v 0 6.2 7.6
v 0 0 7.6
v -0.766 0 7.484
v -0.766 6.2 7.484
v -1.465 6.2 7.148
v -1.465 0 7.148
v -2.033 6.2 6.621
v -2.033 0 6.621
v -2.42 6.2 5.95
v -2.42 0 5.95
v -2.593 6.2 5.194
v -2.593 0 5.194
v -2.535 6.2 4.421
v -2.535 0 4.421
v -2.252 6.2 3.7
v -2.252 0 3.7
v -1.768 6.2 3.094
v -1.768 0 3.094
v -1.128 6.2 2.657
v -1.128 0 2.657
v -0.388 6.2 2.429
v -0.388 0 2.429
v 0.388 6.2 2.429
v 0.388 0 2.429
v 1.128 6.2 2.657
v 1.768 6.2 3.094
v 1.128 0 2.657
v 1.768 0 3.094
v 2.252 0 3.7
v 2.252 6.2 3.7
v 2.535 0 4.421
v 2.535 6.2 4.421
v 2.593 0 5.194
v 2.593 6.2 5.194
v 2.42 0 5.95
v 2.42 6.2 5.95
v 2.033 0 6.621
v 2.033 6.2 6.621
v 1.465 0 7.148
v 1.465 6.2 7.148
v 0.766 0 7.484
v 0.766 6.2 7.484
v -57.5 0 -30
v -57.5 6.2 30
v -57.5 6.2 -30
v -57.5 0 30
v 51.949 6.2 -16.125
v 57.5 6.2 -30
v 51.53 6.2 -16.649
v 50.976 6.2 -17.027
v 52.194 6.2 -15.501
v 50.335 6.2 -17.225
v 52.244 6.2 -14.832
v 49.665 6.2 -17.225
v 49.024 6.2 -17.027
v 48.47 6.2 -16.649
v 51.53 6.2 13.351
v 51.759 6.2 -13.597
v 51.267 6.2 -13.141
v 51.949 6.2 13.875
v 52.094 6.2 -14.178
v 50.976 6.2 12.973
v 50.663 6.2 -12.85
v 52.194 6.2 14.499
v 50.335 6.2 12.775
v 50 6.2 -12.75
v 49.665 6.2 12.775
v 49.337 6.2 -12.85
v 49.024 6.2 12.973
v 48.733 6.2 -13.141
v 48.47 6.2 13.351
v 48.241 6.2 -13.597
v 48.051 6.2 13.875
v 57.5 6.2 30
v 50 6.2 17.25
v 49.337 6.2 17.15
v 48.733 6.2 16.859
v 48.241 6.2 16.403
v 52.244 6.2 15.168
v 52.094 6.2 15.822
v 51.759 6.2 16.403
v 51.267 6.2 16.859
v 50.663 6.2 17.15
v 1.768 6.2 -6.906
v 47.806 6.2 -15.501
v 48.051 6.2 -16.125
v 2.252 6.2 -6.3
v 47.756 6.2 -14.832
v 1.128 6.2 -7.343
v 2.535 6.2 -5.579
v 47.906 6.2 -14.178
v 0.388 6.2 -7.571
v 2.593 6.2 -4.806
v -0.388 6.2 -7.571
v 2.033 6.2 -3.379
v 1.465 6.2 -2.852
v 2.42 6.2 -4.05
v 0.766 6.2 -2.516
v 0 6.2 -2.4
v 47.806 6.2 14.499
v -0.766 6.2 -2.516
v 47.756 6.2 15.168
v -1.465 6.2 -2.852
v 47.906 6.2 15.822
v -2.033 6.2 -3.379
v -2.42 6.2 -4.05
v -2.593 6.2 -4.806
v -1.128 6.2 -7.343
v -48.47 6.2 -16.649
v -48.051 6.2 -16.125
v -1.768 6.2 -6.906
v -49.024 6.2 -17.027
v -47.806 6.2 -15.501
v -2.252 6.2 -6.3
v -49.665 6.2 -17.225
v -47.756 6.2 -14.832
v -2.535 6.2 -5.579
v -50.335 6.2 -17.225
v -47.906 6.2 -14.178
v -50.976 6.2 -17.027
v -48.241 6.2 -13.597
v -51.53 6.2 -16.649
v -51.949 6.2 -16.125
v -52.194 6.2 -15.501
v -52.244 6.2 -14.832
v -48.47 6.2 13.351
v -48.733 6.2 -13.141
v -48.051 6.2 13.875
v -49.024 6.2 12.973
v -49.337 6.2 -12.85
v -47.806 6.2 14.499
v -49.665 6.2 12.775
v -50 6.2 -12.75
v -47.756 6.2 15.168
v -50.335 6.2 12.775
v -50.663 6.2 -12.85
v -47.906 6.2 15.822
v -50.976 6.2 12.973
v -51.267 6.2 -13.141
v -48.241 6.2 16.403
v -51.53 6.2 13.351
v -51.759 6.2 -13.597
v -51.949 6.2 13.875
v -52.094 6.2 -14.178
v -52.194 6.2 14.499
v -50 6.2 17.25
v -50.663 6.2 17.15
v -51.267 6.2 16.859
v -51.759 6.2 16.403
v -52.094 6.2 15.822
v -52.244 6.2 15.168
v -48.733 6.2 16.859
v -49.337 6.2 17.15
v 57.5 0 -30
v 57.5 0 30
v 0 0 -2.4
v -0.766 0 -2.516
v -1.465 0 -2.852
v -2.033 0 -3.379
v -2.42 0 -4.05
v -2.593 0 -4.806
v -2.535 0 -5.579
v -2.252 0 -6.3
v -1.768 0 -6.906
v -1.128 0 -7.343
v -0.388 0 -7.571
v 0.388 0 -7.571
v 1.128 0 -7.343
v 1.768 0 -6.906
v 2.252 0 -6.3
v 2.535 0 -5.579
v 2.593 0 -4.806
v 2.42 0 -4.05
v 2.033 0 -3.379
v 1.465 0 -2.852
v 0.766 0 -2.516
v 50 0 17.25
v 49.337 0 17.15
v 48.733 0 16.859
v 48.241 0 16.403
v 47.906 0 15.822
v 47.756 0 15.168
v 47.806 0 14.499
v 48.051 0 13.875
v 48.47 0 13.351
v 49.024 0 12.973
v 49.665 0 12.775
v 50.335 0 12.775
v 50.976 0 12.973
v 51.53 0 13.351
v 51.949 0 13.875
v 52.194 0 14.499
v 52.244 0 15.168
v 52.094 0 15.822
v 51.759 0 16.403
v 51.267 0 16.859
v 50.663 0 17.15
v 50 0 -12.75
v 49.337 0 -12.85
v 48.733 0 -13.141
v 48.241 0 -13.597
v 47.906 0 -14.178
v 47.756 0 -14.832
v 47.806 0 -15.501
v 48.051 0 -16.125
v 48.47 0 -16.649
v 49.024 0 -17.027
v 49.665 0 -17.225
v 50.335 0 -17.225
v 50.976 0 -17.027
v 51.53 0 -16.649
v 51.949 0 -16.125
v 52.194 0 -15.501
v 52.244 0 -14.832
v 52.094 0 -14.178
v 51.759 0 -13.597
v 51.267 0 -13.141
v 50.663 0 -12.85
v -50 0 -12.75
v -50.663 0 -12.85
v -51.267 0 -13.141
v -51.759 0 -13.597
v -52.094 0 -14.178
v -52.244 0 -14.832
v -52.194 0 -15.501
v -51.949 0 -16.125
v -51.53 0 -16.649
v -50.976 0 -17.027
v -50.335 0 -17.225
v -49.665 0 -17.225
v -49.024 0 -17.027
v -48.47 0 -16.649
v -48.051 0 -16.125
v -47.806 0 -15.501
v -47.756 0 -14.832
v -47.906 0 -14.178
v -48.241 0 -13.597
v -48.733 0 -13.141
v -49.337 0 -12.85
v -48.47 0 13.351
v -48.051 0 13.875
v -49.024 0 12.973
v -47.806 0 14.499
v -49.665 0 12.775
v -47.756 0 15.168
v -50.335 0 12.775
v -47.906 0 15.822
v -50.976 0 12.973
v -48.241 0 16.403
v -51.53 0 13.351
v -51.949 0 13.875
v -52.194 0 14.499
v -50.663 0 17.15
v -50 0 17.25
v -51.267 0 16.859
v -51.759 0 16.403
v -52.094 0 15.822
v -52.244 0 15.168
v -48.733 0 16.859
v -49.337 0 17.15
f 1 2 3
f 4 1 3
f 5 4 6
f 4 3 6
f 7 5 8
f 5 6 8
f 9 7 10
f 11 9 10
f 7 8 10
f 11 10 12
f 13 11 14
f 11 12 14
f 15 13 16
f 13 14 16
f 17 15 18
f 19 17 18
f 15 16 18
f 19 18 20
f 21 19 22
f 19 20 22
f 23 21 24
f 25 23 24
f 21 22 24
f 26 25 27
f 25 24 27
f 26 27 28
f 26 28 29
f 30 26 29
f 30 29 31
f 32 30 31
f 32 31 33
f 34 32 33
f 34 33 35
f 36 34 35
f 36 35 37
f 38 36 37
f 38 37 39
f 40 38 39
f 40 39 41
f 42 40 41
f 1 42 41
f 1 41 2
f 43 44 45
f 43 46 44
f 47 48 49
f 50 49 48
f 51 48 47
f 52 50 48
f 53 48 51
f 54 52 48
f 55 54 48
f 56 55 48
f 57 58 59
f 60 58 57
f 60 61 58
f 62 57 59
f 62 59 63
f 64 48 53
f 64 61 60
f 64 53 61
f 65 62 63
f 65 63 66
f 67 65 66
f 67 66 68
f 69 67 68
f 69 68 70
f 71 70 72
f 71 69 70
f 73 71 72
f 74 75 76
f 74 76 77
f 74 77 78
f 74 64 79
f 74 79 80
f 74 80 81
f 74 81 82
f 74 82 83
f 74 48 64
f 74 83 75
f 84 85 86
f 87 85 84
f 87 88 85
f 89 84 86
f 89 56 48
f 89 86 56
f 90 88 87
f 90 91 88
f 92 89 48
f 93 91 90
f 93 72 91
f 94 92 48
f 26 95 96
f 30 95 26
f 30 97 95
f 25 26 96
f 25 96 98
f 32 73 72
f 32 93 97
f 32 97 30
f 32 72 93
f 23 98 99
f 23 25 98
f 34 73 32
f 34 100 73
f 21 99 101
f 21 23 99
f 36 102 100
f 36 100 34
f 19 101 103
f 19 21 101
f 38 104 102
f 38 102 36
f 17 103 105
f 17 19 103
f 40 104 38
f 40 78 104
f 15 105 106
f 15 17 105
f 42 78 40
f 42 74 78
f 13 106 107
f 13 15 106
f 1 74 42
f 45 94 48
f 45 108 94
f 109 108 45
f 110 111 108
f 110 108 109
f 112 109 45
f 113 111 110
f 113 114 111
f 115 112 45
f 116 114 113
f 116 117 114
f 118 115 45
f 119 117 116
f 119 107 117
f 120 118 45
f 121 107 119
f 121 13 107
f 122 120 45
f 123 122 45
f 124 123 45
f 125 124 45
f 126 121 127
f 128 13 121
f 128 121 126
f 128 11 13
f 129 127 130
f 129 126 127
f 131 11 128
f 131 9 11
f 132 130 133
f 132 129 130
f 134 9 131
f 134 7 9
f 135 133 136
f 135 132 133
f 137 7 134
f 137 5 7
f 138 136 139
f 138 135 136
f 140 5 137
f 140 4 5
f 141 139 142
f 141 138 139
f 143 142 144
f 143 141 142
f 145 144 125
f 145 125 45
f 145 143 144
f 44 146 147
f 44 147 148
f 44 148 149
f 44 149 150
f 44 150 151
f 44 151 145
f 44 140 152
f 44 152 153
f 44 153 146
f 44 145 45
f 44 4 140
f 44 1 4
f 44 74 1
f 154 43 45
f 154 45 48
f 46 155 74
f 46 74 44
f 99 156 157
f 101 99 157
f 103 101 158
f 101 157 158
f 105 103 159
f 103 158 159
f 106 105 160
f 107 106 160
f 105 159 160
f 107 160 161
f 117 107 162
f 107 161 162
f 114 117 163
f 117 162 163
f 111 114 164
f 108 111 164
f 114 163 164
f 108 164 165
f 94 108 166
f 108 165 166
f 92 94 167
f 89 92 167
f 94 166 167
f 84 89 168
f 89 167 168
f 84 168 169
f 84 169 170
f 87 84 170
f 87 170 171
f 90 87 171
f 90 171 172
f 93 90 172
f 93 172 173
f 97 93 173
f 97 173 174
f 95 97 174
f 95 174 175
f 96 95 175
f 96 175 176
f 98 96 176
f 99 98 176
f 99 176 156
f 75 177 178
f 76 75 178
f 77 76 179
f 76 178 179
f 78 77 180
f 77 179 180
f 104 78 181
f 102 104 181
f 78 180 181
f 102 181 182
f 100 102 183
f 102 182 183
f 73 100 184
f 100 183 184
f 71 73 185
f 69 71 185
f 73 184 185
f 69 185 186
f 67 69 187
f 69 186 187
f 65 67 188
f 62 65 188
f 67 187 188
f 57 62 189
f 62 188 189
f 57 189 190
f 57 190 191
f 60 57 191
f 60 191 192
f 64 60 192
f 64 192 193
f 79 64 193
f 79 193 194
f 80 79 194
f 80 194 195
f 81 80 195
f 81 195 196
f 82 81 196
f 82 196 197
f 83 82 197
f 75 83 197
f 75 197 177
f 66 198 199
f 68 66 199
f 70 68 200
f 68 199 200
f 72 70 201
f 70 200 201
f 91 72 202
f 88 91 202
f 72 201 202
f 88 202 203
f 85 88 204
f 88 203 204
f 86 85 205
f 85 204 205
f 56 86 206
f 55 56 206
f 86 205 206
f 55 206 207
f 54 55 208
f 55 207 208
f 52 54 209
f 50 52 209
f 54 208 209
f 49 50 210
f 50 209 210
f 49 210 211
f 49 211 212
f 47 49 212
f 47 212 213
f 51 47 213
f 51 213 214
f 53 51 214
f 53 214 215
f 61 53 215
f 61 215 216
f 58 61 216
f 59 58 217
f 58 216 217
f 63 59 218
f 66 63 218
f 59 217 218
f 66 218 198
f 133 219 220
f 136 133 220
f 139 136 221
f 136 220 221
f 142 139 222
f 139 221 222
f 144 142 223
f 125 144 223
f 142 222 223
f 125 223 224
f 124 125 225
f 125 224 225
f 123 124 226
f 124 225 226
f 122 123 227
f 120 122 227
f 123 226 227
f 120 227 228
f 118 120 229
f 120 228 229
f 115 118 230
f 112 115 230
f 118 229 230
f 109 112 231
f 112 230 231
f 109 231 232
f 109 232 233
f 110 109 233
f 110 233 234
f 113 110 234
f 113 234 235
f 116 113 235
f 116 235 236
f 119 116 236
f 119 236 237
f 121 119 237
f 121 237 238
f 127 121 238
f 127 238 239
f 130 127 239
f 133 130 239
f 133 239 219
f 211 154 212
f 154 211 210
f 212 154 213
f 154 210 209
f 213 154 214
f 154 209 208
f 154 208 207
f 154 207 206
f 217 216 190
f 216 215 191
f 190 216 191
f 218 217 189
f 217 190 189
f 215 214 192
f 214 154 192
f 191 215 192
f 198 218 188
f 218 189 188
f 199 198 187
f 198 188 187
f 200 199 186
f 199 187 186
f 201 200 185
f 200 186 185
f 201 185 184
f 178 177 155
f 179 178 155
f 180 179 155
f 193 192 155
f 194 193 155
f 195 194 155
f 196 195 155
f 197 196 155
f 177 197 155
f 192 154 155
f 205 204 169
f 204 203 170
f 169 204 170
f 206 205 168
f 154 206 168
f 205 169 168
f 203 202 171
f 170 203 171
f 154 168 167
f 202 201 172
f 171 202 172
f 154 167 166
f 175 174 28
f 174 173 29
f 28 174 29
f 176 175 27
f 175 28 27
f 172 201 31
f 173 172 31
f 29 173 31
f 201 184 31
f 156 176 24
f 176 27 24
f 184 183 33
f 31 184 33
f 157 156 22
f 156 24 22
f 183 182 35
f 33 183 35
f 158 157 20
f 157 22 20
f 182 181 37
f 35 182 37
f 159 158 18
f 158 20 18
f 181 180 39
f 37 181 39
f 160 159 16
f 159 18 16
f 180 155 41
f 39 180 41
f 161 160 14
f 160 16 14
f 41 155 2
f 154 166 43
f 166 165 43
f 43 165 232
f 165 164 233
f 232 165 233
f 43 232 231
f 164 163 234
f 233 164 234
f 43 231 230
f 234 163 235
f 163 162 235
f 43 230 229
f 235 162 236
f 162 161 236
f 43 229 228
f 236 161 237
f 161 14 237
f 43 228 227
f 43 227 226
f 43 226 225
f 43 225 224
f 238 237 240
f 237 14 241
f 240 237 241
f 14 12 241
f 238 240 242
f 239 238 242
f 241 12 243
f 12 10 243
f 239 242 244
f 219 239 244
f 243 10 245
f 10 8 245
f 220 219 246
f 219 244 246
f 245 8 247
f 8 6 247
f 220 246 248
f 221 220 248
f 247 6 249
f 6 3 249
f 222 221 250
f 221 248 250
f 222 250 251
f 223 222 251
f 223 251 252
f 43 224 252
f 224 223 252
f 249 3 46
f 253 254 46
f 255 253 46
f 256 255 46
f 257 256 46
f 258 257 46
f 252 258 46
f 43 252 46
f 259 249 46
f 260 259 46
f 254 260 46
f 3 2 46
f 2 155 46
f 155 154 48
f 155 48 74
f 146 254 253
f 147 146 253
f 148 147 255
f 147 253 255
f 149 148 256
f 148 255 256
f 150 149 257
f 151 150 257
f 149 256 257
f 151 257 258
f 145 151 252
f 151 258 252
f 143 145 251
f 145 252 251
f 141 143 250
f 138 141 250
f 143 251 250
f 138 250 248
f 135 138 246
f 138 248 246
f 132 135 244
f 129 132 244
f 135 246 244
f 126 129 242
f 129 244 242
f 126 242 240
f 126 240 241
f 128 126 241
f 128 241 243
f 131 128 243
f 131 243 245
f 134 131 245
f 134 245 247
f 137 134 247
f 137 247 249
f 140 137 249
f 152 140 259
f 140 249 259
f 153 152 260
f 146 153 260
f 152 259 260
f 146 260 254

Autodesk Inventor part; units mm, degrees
ref_plane "YZ Plane" through (0, 0, 0) normal (1, 0, 0) x (0, 1, 0)
ref_plane "XZ Plane" through (0, 0, 0) normal (0, 1, 0) x (-1, 0, 0)
ref_plane "XY Plane" through (0, 0, 0) normal (0, 0, 1) x (1, 0, 0)
sketch "Sketch1" plane through (0, 0, 0) normal (0, 1, 0) x (-1, 0, 0)
  line L0 (57.5, -30) -> (-57.5, -30)
  line L1 (-57.5, -30) -> (-57.5, 30)
  line L2 (-57.5, 30) -> (57.5, 30)
  line L3 (57.5, 30) -> (57.5, -30)
  line L4 (57.5, -30) -> (-57.5, 30) construction
  line L5 (-57.5, -30) -> (57.5, 30) construction
  point P0 (0, 0)
  dimension "d0" = 115
  dimension "d1" = 60
extrude "Extrusion1" add sketch "Sketch1" along normal blind 6.2
sketch "Sketch2" plane through (0, 6.2, 0) normal (0, 1, 0) x (1, 0, 0)
  line L0 (57.5, 30) -> (-57.5, 30) projected
  line L1 (-57.5, 30) -> (-57.5, -30) projected
  line L2 (-57.5, -30) -> (57.5, -30) projected
  line L3 (57.5, -30) -> (57.5, 30) projected
  point P0 (0, 0)
  point P1 (-50, -15)
  point P2 (-50, 15)
  point P3 (50, -15)
  point P4 (50, 15)
  dimension "d4" = 15
  dimension "d5" = 7.5
  dimension "d6" = 15
  dimension "d7" = 7.5
hole "Hole1" at (-50, 6.2, 15) at (-50, 6.2, -15) at (50, 6.2, 15) at (50, 6.2, -15) direction (0, -1, 0) diameter 4.5 end through all
sketch "Sketch3" plane through (0, 6.2, 0) normal (0, 1, 0) x (1, 0, 0)
  point P0 (0, 0)
  point P1 (0, -5)
  point P2 (0, 5)
  dimension "d15" = 5
  dimension "d16" = 5
hole "Hole2" at (0, 6.2, 5) at (0, 6.2, -5) direction (0, -1, 0) diameter 5.2 end through all clearance for "Hex Head Bolt" size "M5" standard "Ansi Metric M Profile"
equation "\"d6\" = d4"
equation "\"d7\" = d5"
properties part number "AjusteBalancin"
